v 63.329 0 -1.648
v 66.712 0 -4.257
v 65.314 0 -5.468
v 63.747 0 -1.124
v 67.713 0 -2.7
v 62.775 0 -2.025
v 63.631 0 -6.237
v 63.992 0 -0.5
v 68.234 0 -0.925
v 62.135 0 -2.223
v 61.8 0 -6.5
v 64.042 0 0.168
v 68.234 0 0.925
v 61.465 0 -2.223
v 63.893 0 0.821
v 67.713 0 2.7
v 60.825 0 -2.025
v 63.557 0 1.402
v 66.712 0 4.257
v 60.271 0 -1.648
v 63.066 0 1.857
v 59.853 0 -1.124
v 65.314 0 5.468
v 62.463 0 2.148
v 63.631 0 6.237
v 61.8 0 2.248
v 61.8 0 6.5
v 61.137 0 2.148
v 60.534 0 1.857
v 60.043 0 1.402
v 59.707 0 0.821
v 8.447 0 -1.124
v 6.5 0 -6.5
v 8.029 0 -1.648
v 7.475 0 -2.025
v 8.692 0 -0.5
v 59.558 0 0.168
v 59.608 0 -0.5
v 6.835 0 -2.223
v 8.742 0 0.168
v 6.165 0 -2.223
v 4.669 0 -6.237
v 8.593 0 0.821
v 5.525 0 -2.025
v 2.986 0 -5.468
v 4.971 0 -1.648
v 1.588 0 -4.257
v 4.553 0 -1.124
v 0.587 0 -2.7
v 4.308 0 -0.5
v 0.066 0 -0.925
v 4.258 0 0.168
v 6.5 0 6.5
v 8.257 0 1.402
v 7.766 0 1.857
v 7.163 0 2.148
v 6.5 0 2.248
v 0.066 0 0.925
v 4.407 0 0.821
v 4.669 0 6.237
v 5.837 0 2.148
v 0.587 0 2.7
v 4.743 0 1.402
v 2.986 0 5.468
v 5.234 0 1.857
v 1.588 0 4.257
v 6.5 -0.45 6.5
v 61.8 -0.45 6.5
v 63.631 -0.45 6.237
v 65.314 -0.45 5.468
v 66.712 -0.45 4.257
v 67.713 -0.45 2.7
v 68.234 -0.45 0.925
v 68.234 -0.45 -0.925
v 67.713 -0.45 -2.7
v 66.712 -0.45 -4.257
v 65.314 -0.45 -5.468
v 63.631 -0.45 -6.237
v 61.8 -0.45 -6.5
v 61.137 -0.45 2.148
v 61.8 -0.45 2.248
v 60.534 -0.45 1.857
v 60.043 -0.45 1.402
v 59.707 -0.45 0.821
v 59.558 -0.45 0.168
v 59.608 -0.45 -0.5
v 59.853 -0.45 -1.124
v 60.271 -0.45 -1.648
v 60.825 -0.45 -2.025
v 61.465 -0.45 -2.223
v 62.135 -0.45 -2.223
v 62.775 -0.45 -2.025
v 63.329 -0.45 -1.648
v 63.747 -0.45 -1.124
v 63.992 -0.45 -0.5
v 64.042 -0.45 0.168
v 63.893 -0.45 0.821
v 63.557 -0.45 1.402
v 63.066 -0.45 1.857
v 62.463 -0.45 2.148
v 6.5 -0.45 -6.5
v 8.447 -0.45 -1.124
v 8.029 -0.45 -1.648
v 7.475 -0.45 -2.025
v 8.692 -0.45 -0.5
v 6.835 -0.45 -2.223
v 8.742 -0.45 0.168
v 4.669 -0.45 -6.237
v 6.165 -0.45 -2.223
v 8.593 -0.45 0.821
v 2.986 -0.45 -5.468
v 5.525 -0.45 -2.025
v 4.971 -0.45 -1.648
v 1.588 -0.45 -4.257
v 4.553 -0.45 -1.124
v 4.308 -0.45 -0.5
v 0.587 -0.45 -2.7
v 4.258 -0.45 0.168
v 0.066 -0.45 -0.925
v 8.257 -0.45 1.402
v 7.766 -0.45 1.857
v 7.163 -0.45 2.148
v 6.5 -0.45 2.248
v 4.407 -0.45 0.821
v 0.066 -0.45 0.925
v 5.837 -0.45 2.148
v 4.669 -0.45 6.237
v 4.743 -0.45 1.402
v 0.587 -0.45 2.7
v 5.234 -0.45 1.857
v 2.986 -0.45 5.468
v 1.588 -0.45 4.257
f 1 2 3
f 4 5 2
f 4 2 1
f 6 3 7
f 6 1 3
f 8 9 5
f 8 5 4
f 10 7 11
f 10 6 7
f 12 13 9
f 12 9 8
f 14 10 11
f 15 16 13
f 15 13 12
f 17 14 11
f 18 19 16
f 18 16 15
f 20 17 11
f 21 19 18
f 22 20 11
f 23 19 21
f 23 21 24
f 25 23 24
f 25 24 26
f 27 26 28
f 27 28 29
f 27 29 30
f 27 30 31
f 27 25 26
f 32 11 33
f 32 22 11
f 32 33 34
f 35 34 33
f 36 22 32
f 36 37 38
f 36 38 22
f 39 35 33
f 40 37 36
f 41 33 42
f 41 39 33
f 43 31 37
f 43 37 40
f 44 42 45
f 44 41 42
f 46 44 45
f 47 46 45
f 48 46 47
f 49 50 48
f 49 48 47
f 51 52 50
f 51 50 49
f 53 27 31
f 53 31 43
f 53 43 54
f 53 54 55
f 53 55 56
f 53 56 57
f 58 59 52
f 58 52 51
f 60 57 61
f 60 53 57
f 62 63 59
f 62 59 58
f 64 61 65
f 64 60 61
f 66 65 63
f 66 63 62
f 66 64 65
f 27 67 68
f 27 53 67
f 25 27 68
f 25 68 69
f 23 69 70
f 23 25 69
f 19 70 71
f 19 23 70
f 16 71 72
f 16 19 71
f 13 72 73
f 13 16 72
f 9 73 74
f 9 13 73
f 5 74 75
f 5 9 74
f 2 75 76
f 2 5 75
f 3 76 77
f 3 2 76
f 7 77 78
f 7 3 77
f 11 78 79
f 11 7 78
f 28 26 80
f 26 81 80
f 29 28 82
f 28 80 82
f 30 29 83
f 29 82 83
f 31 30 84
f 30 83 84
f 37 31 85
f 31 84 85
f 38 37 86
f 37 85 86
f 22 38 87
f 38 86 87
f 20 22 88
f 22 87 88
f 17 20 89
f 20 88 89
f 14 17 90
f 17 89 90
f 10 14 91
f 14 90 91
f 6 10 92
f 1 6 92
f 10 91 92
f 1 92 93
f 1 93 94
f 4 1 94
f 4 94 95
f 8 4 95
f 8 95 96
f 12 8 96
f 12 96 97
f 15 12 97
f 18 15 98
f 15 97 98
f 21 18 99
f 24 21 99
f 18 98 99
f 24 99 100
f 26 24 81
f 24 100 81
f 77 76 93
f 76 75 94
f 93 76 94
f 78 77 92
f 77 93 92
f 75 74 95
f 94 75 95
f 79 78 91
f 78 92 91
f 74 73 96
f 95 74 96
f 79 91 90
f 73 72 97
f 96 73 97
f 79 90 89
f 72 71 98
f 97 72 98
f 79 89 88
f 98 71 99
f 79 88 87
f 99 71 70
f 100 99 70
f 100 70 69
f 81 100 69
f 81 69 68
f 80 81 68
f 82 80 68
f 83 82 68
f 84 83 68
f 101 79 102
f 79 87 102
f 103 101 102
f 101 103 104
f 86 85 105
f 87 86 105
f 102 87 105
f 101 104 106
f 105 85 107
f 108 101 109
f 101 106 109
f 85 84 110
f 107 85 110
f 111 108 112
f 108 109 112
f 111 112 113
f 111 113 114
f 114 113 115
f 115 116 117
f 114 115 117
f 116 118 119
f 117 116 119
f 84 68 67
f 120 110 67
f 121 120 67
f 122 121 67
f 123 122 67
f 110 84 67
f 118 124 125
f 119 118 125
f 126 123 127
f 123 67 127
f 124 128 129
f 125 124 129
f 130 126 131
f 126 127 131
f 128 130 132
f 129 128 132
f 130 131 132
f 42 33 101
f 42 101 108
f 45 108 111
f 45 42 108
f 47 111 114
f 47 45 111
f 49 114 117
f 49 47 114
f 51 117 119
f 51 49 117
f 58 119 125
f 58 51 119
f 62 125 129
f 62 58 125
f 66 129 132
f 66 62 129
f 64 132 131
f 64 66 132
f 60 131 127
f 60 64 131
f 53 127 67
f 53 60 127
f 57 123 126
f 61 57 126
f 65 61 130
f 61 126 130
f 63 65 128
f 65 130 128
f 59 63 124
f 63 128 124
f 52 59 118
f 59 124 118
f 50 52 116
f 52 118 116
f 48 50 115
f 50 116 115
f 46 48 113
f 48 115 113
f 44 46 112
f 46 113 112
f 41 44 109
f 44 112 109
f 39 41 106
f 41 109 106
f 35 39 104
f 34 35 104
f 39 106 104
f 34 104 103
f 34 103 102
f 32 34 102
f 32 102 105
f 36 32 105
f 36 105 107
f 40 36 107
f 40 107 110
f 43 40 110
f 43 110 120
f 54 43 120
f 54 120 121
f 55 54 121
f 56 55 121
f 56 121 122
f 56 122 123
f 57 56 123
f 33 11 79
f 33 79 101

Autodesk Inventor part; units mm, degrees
ref_plane "YZ Plane" through (0, 0, 0) normal (1, 0, 0) x (0, 1, 0)
ref_plane "XZ Plane" through (0, 0, 0) normal (0, 1, 0) x (-1, 0, 0)
ref_plane "XY Plane" through (0, 0, 0) normal (0, 0, 1) x (1, 0, 0)
sketch "Sketch1" plane through (0, 0, 0) normal (0, 1, 0) x (-1, 0, 0)
  line L0 (0, 0) -> (-68.3, 0) construction
  line L1 (-6.5, 6.5) -> (-61.8, 6.5)
  line L2 (-61.8, -6.5) -> (-6.5, -6.5)
  arc A0 (-6.5, -6.5) -> (-6.5, 6.5) centre (-6.5, 0) ccw
  arc A1 (-61.8, 6.5) -> (-61.8, -6.5) centre (-61.8, 0) ccw
  line L3 (-23.9184, -1.1237) -> (-43.8581, -1.1237) construction
  line L4 (-43.8581, -1.1237) -> (-43.8581, 0.6417) construction
  line L5 (-43.8581, 0.6417) -> (-23.9184, 0.6417) construction
  line L6 (-23.9184, 0.6417) -> (-23.9184, -1.1237) construction
  line L7 (-34.15, -6.5) -> (-34.15, 6.5) construction
  point P0 (-34.15, 0)
  dimension "MinimumRemnant" = 0.9
  dimension "d21" = 68.3
  dimension "d22" = 13
extrude "Plate2" add sketch "Sketch1" against normal blind 0.45
hole "Hole2" at (6.5, 0, 0) at (61.8, 0, 0) direction (0, -1, 0) diameter 4.4958 end through all clearance for "Socket Head Cap Screw" size "M4" standard "Ansi Metric M Profile"
equation "\"MinimumRemnant\" = 2 * Thickness"
equation "\"d29\" = Thickness"
equation "\"d23\" = Thickness"
equation "\"BendRadius\" = Thickness"
equation "\"BendReliefWidth\" = Thickness"
equation "\"BendReliefDepth\" = 0.5 * Thickness"
equation "\"CornerReliefSize\" = 4 * Thickness"
equation "\"TransitionRadius\" = BendRadius"
equation "\"JacobiRadiusSize\" = BendRadius"
equation "\"GapSize\" = Thickness"
equation "\"radius\" = 6"
equation "\"Thickness\" = 0.45"
properties part number "Part16.5mm" material "Steel, Carbon"
